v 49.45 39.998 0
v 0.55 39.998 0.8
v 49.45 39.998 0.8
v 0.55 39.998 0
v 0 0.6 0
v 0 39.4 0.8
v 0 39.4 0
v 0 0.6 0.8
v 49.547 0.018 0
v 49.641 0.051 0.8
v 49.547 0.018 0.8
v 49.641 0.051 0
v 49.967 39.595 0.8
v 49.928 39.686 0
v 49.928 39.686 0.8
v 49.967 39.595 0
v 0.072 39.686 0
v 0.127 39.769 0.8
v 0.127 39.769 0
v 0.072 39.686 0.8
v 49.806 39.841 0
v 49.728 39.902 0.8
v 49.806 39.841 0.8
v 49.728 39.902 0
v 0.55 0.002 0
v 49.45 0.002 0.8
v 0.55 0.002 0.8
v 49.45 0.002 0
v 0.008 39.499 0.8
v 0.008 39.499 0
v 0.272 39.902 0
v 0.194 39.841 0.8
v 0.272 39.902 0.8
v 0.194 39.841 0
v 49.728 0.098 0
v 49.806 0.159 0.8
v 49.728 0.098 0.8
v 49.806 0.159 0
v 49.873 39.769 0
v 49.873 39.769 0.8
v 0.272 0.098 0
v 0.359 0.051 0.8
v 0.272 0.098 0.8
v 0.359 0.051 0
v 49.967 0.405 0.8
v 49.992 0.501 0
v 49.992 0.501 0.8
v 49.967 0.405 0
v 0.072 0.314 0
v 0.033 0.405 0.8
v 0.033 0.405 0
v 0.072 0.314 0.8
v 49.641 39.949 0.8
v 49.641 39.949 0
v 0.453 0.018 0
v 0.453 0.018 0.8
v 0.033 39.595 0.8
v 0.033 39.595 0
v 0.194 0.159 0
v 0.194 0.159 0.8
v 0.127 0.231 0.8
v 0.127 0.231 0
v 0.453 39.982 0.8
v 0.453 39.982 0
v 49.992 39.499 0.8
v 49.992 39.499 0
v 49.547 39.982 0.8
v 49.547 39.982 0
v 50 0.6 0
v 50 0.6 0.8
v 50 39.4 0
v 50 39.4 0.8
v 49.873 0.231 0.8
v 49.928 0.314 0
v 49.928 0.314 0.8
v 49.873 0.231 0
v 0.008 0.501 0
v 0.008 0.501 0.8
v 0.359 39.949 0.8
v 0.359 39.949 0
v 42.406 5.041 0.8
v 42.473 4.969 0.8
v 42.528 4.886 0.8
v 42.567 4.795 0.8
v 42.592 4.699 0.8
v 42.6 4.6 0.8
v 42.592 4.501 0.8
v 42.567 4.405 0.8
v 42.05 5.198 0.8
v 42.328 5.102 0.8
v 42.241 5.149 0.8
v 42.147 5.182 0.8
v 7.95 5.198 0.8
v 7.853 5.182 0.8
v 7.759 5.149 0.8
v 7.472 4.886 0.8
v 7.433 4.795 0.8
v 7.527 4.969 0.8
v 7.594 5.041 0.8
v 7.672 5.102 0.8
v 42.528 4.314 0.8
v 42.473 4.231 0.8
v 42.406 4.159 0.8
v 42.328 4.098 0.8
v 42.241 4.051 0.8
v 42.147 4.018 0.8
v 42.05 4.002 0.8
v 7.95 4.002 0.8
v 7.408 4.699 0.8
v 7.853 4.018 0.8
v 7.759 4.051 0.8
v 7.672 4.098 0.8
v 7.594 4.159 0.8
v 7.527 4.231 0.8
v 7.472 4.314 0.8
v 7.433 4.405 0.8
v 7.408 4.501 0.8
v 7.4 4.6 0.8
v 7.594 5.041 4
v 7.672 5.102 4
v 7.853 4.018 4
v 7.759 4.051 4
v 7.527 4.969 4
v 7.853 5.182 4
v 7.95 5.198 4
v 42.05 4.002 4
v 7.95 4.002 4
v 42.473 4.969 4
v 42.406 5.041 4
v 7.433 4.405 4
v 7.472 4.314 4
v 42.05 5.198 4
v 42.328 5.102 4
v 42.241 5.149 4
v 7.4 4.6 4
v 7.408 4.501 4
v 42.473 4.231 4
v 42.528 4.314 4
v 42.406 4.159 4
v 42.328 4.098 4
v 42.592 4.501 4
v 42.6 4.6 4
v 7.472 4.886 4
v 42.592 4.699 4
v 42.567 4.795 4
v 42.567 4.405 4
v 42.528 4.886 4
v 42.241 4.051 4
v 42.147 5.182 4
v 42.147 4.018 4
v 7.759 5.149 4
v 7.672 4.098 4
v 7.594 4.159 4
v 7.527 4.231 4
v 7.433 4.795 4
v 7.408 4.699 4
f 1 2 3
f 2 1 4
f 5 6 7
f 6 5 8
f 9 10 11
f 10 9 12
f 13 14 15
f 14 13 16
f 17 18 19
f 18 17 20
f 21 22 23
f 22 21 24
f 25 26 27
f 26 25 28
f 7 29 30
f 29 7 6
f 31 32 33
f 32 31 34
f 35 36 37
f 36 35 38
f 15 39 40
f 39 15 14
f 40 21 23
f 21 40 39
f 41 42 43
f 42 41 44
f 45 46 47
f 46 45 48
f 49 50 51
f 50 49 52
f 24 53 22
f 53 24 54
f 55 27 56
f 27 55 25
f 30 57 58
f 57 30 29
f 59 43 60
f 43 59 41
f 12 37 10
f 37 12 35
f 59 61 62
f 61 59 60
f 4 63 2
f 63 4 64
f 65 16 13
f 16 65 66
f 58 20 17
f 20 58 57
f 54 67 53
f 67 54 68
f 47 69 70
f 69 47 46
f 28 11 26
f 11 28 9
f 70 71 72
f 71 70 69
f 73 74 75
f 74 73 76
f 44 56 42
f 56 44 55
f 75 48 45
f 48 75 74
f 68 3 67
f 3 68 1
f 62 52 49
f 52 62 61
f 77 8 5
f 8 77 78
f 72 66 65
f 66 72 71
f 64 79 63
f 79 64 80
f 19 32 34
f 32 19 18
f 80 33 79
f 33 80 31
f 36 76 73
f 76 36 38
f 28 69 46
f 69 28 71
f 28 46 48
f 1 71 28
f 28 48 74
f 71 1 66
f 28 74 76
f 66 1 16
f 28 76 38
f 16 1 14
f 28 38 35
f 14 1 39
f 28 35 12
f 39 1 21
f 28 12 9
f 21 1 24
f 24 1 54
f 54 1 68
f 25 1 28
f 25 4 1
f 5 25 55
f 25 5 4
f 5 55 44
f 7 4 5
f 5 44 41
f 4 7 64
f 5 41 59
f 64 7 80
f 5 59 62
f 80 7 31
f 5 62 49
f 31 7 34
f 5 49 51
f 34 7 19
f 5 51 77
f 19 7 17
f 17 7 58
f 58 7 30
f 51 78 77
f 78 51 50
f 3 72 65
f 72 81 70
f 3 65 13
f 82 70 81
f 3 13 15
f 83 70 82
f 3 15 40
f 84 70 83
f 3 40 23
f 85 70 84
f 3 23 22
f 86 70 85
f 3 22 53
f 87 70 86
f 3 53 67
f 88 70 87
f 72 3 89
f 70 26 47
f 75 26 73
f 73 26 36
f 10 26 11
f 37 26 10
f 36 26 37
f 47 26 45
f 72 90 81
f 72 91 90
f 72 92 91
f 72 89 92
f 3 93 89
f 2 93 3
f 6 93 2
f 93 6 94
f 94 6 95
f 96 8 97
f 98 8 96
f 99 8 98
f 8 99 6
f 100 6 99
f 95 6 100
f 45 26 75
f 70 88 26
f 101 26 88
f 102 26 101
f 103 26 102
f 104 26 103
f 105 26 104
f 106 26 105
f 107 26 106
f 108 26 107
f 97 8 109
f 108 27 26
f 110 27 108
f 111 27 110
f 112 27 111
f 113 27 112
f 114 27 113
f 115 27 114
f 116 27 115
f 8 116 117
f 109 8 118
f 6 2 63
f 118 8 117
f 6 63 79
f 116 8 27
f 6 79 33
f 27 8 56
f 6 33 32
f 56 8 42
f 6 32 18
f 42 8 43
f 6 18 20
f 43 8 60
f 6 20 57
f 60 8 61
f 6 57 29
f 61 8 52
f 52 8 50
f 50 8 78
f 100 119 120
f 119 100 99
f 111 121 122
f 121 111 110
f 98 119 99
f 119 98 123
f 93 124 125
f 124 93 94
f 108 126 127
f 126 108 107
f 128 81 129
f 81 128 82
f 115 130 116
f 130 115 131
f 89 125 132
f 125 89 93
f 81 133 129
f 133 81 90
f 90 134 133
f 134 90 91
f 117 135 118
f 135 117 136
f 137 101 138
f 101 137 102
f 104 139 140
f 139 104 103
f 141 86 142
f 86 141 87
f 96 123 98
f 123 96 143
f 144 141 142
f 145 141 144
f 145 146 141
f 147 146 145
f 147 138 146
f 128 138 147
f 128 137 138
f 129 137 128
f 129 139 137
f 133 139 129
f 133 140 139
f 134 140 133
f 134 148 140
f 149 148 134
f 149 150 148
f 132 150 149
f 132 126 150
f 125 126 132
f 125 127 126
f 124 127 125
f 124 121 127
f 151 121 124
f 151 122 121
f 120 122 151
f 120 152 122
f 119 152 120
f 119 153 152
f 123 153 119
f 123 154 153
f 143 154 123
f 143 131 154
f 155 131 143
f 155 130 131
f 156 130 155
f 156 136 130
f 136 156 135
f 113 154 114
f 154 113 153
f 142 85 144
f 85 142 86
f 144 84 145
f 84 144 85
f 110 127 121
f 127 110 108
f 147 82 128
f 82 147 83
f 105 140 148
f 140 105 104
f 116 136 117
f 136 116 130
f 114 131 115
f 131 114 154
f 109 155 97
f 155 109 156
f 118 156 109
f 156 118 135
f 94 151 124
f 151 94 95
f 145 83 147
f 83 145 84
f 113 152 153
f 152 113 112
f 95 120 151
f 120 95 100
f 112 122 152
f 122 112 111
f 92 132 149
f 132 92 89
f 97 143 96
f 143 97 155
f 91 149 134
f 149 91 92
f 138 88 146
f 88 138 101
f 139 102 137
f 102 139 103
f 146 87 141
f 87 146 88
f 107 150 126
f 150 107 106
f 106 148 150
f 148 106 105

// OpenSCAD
// Minimum render angle
$fa = 1;
// Minimum render size
$fs = 0.1;

w = 50;
h = 40;
d = 0.8;

handleWidth = (w - 16);
handleHeight = 4;
handleDepth = 1.2;
handleOffset = 4;

construction();

module construction() {
	union() {
		{
			mainUnit();
		}
		{
			handle();
		}
	}
}

module mainUnit() {
	hull() {
		{

		}
		{
			union() {
				translate( [handleDepth/2, handleDepth/2, 0] ) cylinder( r=handleDepth/2, h=d );
				translate( [(handleDepth/2) + (w - handleDepth), handleDepth/2, 0] ) cylinder( r=handleDepth/2, h=d );
				translate( [handleDepth/2, handleDepth/2  + (h - handleDepth), 0] ) cylinder( r=handleDepth/2, h=d );
				translate( [(handleDepth/2) + (w - handleDepth), handleDepth/2  + (h - handleDepth), 0] ) cylinder( r=handleDepth/2, h=d );
			}
		}
	}
}


module handle() {
	// add the handle
	translate( [(w/2) - (handleWidth/2), handleOffset, 0] )
	{
		hull()
		{
			{

			}
			{
				union() {
					translate( [0, handleDepth/2, handleHeight/2] ) cylinder( r=handleDepth/2, h=handleHeight, center=true );
					translate( [handleWidth, handleDepth/2, handleHeight/2] ) cylinder( r=handleDepth/2, h=handleHeight, center=true );
				}
			}

		}

	}
}
